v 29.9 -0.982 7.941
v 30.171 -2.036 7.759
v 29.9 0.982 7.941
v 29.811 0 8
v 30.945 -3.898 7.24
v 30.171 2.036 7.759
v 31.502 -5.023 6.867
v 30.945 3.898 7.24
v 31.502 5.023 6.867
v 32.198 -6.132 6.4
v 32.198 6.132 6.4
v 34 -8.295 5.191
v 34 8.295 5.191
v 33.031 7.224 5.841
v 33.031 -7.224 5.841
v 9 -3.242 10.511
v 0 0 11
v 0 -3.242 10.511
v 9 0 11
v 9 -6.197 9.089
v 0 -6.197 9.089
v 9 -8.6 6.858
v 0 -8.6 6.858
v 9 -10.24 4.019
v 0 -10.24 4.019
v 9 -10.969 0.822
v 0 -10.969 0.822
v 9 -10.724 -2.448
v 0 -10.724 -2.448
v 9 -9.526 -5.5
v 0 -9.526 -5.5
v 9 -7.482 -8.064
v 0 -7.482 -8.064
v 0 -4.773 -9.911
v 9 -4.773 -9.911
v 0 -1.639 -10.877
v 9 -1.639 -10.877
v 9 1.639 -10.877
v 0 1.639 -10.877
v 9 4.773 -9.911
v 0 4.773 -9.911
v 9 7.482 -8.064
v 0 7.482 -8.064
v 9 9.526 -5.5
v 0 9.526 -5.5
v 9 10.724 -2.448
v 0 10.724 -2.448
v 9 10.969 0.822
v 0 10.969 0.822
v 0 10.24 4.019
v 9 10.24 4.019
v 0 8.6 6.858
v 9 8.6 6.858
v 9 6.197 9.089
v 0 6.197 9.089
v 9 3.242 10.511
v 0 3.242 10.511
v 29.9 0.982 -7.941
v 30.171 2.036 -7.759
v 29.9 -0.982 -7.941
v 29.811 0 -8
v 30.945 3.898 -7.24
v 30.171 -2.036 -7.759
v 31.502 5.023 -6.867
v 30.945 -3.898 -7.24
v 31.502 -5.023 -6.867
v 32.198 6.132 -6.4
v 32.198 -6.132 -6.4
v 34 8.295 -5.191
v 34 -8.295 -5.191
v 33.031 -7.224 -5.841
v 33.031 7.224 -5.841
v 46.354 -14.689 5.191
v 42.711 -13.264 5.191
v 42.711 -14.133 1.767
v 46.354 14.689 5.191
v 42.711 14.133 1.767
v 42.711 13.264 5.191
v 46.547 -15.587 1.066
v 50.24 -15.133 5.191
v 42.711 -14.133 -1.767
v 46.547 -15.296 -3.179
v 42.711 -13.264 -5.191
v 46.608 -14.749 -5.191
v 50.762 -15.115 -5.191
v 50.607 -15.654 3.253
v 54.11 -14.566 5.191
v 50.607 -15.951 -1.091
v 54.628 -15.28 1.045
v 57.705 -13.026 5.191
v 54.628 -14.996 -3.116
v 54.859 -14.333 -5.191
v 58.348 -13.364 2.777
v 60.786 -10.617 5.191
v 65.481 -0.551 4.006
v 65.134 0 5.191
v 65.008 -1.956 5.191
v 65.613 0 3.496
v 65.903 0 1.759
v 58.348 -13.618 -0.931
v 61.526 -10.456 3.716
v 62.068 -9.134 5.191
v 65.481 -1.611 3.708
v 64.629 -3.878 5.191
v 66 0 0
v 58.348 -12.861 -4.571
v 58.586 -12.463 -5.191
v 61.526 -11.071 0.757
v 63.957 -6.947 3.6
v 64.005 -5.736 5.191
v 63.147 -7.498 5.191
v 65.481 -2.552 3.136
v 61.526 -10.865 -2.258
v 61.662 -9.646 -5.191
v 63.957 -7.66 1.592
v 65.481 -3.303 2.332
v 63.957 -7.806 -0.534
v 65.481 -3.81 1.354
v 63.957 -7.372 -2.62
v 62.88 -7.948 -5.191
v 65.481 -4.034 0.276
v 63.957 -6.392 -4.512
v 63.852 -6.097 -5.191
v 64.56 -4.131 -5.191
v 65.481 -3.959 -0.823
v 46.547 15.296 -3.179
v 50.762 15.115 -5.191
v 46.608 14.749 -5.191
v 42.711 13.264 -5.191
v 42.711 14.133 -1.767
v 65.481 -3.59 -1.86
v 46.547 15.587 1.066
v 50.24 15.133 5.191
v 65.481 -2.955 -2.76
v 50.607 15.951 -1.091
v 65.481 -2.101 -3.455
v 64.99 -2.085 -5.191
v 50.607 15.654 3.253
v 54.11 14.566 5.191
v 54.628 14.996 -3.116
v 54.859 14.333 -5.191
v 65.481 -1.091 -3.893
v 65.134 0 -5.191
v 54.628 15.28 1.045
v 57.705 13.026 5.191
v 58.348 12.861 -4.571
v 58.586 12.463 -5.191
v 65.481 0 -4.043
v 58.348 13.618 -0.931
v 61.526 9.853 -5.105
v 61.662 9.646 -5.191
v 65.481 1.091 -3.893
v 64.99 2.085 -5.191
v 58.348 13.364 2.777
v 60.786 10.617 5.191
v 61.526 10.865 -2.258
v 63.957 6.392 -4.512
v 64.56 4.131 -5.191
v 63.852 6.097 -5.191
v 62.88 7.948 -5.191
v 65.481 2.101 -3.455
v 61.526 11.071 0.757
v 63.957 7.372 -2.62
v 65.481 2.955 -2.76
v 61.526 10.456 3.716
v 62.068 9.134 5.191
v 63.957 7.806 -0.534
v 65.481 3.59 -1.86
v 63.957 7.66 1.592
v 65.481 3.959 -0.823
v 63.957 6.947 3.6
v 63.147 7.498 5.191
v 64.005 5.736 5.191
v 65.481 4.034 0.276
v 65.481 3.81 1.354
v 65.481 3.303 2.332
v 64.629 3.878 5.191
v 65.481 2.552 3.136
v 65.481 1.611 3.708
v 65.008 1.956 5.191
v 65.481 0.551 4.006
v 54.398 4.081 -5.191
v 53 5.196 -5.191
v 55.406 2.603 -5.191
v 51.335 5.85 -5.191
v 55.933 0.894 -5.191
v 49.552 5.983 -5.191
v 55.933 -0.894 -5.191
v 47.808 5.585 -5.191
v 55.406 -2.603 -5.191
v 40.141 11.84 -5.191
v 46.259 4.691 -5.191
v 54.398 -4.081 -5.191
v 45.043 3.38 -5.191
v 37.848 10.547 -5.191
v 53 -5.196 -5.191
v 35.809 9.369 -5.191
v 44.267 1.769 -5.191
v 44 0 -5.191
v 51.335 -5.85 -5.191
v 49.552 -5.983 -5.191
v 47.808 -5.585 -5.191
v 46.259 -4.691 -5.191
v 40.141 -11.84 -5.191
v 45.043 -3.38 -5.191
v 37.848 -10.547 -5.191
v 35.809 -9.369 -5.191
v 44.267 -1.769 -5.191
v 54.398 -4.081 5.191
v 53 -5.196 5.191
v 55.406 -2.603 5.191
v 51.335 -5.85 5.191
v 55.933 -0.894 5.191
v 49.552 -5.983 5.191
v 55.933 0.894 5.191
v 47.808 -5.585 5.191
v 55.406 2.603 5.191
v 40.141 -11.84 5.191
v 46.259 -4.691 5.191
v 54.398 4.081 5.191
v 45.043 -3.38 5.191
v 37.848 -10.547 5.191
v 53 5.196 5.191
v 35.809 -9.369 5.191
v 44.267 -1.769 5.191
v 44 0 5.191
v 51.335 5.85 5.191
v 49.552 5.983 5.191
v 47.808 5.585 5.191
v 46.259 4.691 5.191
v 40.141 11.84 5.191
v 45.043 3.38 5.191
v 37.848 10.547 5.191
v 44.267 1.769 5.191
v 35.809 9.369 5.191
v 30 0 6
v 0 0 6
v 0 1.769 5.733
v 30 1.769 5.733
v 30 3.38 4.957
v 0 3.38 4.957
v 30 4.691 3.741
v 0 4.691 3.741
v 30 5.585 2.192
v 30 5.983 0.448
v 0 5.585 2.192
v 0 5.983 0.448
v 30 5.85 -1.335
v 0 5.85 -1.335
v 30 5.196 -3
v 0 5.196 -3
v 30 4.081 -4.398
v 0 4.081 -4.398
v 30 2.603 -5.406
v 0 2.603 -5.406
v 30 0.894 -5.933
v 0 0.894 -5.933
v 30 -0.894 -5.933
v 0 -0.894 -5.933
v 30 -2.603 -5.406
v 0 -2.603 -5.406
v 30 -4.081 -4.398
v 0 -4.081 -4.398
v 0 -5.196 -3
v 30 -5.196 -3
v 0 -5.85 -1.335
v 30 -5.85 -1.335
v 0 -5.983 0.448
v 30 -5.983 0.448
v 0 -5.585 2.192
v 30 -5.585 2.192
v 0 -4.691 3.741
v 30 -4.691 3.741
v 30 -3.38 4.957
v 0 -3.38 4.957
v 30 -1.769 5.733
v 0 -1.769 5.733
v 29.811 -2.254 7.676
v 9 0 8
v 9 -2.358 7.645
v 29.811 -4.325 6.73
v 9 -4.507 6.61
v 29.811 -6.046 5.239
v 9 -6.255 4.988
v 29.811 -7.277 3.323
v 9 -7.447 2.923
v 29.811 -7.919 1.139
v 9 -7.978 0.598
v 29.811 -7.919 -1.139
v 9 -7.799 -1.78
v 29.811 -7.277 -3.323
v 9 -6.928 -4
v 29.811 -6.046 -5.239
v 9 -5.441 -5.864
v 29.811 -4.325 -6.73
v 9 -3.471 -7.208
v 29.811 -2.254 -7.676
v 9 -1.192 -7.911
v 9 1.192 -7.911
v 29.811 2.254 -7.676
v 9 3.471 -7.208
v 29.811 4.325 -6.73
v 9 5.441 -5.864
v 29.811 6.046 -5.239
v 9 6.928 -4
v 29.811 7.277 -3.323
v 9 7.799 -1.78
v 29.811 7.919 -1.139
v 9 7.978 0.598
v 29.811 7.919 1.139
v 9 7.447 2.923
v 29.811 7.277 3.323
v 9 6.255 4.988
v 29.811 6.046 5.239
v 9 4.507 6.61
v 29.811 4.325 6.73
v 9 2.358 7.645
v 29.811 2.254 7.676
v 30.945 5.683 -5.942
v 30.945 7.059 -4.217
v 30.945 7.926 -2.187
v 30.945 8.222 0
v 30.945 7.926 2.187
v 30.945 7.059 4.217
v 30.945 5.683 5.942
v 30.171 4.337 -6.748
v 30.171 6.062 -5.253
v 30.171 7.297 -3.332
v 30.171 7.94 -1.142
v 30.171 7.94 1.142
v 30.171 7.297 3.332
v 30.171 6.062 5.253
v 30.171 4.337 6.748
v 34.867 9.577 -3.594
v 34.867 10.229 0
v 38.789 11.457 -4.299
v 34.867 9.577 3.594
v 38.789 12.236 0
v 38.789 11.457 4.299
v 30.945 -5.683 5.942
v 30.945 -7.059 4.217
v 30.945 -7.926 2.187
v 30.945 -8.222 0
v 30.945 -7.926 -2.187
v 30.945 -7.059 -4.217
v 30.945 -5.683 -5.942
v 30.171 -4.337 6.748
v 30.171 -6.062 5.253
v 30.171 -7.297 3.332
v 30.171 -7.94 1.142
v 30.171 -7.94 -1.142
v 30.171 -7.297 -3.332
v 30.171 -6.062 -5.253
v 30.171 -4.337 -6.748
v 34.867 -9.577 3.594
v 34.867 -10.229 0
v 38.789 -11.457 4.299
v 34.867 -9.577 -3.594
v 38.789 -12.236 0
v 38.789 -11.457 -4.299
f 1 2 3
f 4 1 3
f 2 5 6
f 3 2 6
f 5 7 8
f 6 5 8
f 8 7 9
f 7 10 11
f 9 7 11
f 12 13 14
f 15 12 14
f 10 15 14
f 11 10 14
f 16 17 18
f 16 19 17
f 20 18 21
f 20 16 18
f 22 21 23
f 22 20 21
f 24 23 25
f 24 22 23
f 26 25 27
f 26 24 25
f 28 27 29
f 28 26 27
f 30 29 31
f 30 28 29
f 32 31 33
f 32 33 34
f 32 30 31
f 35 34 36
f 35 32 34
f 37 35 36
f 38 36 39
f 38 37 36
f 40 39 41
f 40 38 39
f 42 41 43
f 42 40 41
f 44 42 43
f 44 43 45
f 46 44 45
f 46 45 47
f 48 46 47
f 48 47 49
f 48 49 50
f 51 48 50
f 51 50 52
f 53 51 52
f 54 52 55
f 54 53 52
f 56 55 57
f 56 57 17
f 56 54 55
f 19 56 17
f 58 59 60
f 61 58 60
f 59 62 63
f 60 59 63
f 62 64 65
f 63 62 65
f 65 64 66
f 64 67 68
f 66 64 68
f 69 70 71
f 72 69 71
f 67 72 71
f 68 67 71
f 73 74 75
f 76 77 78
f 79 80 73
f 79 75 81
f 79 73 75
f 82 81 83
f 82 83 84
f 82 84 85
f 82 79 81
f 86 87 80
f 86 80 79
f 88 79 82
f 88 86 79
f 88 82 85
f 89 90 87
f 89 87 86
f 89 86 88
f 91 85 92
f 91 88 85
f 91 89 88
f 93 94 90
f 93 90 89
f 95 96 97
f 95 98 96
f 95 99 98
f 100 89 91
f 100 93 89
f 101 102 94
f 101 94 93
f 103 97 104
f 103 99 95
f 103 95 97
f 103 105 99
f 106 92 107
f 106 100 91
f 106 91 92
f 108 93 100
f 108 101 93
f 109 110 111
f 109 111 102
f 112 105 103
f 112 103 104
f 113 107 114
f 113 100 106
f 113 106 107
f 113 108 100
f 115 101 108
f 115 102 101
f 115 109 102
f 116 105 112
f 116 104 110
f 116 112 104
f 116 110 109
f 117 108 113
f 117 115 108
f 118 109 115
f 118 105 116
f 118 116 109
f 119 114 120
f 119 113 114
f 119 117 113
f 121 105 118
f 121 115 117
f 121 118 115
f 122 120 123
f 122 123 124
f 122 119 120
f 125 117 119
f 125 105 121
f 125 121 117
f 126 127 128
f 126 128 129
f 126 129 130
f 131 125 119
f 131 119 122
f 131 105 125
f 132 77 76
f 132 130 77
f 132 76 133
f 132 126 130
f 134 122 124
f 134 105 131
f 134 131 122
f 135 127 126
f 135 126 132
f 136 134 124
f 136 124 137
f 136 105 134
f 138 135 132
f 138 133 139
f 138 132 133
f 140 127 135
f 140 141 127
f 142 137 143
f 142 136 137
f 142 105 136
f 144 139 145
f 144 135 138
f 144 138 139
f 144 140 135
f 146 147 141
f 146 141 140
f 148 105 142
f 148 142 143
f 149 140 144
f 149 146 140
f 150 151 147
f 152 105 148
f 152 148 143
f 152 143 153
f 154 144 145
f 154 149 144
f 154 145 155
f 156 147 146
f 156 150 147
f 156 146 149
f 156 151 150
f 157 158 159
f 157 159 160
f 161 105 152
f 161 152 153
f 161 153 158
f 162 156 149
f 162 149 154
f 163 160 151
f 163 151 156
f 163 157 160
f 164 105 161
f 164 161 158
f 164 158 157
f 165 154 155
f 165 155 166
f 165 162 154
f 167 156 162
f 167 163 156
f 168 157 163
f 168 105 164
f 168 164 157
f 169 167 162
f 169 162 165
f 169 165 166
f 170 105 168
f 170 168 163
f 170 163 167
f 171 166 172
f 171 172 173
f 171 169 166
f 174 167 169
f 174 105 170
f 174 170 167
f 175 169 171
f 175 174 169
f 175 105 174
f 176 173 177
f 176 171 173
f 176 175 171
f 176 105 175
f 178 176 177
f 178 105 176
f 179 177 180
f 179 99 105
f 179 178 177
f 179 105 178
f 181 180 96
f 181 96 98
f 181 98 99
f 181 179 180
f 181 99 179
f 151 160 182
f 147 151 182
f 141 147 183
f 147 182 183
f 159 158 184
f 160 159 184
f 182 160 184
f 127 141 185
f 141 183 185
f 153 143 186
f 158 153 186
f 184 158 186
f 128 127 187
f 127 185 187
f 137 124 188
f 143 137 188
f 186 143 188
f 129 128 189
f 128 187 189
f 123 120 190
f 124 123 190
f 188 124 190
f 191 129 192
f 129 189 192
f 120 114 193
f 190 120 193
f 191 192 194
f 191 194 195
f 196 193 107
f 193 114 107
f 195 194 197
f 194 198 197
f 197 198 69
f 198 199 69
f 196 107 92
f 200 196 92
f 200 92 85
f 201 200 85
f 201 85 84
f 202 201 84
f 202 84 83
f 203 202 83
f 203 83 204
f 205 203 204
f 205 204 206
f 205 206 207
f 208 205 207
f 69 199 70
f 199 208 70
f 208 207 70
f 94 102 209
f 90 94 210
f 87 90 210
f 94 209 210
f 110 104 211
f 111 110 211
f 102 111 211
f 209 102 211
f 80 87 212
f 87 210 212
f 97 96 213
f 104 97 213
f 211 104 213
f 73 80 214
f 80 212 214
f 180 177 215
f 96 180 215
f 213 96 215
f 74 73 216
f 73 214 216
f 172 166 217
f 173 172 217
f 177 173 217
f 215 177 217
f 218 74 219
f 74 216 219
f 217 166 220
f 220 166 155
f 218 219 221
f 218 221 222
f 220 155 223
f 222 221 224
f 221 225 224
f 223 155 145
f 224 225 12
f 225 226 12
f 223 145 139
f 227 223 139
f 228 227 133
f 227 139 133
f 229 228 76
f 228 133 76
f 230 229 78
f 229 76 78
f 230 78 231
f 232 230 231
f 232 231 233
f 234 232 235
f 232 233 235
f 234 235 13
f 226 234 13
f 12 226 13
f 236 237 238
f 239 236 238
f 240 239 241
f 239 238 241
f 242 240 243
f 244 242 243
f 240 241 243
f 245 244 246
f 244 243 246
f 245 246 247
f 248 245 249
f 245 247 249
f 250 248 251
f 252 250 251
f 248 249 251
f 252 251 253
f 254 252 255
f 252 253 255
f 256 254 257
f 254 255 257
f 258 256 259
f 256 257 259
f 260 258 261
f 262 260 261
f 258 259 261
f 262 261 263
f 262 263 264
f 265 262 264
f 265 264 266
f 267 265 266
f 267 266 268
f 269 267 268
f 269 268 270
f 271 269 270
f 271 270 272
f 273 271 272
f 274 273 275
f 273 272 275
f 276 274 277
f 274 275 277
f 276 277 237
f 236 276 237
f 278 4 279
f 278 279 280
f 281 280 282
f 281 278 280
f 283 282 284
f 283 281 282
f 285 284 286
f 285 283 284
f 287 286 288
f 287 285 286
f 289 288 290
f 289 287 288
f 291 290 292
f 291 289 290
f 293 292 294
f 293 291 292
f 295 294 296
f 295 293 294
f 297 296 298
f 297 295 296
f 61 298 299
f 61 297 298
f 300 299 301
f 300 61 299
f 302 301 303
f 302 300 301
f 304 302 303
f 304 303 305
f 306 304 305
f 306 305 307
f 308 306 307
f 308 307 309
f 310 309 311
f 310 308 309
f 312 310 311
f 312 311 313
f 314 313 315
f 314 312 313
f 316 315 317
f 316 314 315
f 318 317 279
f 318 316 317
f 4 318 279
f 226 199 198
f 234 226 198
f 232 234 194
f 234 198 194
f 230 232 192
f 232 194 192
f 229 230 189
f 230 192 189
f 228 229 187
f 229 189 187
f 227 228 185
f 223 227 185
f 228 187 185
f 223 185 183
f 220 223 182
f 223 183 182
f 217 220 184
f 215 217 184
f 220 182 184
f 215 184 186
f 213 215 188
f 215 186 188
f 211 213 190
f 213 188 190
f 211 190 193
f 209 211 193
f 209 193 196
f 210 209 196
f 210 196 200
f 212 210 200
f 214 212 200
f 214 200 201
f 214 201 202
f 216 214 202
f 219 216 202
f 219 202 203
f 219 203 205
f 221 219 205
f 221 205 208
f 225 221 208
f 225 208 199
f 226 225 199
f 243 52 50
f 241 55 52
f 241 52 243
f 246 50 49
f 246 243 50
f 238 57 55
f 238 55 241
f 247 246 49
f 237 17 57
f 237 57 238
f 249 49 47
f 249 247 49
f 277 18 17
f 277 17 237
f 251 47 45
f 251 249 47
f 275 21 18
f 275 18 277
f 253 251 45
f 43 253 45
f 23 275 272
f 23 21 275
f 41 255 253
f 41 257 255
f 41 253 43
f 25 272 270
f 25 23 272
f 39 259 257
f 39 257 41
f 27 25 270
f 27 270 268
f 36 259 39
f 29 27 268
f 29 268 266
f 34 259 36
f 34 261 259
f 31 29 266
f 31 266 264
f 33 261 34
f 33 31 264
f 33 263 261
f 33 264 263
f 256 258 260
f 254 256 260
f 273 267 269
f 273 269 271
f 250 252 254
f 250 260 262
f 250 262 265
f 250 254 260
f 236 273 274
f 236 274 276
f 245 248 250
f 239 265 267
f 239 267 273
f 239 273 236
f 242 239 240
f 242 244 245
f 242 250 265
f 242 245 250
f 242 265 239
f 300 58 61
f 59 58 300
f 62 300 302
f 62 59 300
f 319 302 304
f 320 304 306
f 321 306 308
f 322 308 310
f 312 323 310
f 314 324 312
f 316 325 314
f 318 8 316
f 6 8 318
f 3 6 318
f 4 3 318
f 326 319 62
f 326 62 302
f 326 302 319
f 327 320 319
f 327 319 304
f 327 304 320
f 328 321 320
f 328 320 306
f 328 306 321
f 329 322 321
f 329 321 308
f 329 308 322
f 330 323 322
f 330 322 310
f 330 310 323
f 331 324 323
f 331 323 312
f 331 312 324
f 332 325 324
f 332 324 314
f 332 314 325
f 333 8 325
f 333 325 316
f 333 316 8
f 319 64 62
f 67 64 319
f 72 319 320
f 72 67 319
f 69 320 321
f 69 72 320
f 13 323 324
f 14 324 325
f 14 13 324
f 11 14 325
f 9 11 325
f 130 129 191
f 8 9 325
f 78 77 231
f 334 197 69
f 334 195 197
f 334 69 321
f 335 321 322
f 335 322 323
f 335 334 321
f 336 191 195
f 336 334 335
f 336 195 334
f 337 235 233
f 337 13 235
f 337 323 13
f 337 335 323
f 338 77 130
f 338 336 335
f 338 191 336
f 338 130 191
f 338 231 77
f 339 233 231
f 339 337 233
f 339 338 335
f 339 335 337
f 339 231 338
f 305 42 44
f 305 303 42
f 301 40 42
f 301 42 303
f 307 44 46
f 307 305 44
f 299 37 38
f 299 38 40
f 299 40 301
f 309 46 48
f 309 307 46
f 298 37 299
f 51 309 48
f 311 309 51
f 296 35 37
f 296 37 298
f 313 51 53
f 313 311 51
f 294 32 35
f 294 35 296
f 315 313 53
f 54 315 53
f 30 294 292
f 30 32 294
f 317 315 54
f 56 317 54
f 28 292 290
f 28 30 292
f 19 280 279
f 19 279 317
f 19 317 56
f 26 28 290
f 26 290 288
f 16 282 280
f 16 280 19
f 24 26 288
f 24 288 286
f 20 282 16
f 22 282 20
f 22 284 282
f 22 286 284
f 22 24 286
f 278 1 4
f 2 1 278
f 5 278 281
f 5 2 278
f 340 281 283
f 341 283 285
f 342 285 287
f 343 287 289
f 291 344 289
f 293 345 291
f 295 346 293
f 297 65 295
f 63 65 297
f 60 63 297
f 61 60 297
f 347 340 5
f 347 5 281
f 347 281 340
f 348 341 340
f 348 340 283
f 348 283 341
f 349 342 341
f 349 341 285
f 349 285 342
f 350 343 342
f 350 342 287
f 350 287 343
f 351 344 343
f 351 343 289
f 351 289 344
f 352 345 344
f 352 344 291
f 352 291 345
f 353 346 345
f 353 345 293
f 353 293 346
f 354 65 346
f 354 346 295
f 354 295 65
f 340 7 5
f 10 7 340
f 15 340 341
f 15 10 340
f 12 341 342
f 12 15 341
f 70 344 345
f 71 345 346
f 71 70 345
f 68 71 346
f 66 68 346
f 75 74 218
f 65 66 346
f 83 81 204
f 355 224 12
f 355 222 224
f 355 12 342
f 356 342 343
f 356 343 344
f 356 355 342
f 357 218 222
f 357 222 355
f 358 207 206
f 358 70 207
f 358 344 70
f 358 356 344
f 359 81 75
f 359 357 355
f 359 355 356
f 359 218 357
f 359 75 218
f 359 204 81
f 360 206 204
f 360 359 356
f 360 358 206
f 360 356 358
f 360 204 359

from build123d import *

# Parameters (mm, degrees)
CUT_EXTRUDE_1_DEPTH = 17.5
SKETCH_3_R          = 6
CUT_EXTRUDE_2_DEPTH = 30
SKETCH_4_R          = 6
CUT_EXTRUDE_3_DEPTH = 30


with BuildPart() as part:
    # 草图1 → 旋转1 (revolve)
    with BuildSketch(Plane(origin=(0, 0, 0), x_dir=(1, 0, 0), z_dir=(0, 1, 0)), mode=Mode.PRIVATE) as revolve_1_sk:
        with BuildLine():
            Line((0, 0), (0, 11))
            Line((0, 11), (9, 11))
            Line((9, 11), (9, 8))
            Line((9, 8), (29.811328827, 8))
            ThreePointArc((29.811328827, 8), (30.38898409, 8.056139542), (30.945019819, 8.222457069))
            Line((30.945019819, 8.222457069), (42.711427769, 14.243479731))
            ThreePointArc((42.711427769, 14.243479731), (58.348138844, 13.649490021), (66, 0))
            Line((66, 0), (0, 0))
        make_face()
    revolve(revolve_1_sk.sketch.rotate(Axis((0, 0, 0), (1, 0, 0)), 180), axis=Axis((0, 0, 0), (1, 0, 0)))

    # 草图2 → 拉伸1 (cut, symmetric)
    with BuildSketch(Plane(origin=(0, 0, 0), x_dir=(1, 0, 0), z_dir=(0, 1, 0))):
        Polygon((72.287262903, 20.406671453), (73.576090576, 5.191308691), (34, 5.191308691), (29.811328827, 8), (29.00979021, 16.150849151), align=None)
        Polygon((34, -5.191308691), (29.811328827, -8), (29.00979021, -16.150849151), (72.287262903, -20.406671453), (73.576090576, -5.191308691), align=None)
    extrude(amount=CUT_EXTRUDE_1_DEPTH, both=True, mode=Mode.SUBTRACT)

    # 草图3 → 拉伸2 (cut)
    with BuildSketch(Plane(origin=(0, 0, -5.191308691), x_dir=(-1, 0, 0), z_dir=(0, 0, -1))):
        with Locations((-50, 0)):
            Circle(SKETCH_3_R)
    extrude(amount=-CUT_EXTRUDE_2_DEPTH, mode=Mode.SUBTRACT)

    # 草图4 → 拉伸3 (cut)
    with BuildSketch(Plane.ZY):
        Circle(SKETCH_4_R)
    extrude(amount=-CUT_EXTRUDE_3_DEPTH, mode=Mode.SUBTRACT)


solid = part.part
